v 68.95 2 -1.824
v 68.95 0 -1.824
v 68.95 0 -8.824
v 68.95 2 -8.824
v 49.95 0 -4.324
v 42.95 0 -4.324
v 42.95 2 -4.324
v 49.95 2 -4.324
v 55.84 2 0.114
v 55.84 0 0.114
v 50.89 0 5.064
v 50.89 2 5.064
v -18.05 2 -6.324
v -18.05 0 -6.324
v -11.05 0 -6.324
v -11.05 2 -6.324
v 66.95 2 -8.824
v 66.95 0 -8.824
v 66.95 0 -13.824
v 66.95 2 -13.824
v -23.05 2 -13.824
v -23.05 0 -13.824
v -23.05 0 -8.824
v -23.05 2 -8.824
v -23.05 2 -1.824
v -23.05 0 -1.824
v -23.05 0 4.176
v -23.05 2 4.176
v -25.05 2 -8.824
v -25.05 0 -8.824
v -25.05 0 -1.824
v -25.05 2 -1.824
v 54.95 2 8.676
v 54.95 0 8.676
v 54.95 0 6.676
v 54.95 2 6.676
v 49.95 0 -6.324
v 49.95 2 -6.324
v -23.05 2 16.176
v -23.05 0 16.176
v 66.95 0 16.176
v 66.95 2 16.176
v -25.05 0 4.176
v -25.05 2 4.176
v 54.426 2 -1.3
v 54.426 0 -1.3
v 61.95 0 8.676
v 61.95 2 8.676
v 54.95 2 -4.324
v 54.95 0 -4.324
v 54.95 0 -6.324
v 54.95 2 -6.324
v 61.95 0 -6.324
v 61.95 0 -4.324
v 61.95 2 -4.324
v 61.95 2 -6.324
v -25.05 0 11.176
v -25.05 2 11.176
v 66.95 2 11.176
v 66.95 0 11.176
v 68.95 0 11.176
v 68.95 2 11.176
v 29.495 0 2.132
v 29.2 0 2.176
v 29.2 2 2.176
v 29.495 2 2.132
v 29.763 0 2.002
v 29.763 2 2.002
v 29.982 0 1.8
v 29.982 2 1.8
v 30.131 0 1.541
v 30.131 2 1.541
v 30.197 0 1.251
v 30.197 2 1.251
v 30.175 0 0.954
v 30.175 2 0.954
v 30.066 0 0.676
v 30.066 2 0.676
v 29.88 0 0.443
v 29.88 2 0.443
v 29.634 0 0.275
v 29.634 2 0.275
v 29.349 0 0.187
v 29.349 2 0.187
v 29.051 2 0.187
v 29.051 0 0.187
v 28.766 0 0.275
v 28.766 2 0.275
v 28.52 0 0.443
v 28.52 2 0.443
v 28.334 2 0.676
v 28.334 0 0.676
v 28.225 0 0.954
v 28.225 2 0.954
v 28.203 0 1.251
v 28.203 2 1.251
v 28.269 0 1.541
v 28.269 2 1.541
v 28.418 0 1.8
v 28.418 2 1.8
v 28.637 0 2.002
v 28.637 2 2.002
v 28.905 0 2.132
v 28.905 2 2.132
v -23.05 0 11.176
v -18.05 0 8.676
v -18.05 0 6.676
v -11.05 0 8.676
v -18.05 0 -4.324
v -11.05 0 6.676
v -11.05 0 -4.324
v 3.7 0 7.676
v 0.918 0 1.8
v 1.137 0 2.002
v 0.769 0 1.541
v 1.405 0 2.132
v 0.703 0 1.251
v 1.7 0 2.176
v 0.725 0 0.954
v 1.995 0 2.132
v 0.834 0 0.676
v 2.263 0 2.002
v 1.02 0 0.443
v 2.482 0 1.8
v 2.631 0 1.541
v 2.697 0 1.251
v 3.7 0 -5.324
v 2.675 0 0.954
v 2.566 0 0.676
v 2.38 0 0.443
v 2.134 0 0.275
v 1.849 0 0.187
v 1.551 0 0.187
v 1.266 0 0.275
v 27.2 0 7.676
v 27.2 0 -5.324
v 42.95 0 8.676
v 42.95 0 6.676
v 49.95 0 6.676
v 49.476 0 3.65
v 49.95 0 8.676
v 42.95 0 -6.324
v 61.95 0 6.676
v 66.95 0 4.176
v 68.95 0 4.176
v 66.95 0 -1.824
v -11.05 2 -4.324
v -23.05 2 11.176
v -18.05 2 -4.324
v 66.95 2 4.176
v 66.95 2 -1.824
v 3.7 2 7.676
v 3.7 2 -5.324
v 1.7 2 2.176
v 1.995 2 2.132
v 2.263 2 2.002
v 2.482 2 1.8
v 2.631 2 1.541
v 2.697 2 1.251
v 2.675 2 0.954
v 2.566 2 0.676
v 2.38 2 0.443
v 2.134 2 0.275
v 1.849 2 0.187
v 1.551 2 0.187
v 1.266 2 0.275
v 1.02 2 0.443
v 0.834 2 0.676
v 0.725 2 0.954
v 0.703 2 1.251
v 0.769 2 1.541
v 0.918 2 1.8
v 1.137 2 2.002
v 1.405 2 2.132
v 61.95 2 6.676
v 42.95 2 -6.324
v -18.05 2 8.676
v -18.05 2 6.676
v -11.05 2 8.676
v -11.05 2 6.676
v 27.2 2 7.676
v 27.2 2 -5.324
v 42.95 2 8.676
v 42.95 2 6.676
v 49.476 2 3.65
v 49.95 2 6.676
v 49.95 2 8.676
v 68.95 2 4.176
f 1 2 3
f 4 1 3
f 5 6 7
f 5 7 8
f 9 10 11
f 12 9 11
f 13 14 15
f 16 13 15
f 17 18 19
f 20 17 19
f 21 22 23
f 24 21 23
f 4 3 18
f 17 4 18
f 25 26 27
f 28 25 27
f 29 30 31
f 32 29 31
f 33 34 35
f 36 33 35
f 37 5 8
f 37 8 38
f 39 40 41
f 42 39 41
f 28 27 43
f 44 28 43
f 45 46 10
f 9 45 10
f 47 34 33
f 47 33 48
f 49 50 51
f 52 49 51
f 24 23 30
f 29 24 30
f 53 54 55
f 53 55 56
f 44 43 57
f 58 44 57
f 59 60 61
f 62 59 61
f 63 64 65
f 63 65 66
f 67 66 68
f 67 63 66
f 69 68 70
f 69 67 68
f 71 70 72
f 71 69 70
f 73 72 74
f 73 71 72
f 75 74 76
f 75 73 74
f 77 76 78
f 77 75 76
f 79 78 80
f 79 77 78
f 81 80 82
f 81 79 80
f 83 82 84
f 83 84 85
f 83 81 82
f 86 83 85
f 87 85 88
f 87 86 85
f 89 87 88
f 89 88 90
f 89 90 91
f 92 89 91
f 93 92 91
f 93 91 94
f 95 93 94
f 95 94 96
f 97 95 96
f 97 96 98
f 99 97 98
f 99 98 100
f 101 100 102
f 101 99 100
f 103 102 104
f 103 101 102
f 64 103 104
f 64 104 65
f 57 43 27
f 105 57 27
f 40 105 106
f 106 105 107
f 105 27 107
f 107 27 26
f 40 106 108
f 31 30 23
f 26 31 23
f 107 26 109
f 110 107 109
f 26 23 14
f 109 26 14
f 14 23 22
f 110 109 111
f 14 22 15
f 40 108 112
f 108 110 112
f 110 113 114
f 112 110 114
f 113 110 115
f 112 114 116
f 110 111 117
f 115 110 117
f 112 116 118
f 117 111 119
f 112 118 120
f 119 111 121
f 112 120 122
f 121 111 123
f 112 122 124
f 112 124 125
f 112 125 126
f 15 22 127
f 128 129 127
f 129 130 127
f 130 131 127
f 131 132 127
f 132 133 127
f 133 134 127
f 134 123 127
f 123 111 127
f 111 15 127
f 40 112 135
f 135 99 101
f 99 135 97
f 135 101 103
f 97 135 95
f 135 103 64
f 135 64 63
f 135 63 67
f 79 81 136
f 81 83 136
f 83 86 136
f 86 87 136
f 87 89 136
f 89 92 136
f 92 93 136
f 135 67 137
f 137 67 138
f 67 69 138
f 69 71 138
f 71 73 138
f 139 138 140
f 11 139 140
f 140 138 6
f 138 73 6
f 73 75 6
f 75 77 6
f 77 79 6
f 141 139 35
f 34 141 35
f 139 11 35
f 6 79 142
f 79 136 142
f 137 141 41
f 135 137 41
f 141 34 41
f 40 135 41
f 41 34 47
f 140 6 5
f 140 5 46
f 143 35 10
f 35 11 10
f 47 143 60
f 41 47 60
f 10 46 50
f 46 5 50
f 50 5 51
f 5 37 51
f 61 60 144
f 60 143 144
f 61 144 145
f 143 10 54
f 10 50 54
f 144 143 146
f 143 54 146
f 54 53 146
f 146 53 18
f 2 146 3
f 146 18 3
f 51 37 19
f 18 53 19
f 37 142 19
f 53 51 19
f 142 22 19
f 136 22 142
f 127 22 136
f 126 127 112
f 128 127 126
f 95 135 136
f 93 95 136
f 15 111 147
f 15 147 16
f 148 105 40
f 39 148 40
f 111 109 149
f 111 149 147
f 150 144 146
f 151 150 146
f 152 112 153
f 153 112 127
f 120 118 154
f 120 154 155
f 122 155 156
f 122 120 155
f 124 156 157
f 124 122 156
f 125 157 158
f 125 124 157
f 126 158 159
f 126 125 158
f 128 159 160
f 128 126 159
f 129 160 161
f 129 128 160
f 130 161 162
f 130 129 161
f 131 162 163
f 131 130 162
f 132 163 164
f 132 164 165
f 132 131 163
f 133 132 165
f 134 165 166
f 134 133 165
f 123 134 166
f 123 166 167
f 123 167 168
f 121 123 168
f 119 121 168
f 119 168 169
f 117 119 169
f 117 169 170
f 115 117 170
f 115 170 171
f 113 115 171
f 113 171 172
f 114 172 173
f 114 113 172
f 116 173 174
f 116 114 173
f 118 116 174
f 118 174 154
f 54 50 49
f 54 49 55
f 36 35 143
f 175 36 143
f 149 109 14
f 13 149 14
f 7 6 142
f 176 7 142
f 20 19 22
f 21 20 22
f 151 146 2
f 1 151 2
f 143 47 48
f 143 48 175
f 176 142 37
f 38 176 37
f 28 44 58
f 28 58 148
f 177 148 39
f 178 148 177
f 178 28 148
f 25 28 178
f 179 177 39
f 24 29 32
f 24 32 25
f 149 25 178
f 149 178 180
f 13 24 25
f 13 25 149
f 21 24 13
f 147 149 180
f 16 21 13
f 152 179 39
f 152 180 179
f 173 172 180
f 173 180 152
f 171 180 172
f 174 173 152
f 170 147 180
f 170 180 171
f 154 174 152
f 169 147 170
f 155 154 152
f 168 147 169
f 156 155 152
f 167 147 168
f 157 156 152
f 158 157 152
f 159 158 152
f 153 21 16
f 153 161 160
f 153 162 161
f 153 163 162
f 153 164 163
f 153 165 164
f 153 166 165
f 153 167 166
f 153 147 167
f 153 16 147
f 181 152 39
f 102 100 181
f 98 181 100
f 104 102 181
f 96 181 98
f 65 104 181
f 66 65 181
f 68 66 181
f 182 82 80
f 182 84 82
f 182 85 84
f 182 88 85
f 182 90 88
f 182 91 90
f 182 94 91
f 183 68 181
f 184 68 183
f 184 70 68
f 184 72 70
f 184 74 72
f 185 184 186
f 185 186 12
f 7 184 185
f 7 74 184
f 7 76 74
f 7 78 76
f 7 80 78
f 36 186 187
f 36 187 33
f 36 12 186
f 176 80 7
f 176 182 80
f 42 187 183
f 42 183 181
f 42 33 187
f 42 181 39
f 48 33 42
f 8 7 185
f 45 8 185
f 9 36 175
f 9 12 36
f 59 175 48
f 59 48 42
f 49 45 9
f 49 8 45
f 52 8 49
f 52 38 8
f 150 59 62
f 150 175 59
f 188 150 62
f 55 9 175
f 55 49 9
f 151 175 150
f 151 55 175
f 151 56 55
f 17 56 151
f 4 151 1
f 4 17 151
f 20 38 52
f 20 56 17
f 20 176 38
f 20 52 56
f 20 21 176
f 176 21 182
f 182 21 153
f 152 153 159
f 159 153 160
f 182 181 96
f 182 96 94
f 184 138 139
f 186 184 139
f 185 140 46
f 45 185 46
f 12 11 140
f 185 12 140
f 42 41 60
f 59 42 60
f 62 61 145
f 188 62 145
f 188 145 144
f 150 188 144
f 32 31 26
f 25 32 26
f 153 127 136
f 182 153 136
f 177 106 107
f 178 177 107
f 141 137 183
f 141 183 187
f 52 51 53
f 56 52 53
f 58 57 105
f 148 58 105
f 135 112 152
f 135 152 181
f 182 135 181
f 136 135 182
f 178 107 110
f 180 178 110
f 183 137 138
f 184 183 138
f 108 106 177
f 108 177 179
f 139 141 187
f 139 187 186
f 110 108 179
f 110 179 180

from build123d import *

# Parameters (mm, degrees)
SKETCH1_W           = 7
SKETCH1_H           = 2
SKETCH1_R           = 1
SKETCH1_W_2         = 23.5
SKETCH1_H_2         = 13
BOSS_EXTRUDE1_DEPTH = 2


with BuildPart() as part:
    # Sketch1 → Boss-Extrude1 (new body)
    with BuildSketch(Plane(origin=(0, 0, 0), x_dir=(1, 0, 0), z_dir=(0, 1, 0))):
        Polygon((66.949898611, 13.823848353), (-23.050101389, 13.823848353), (-23.050101389, 8.823848353), (-25.050101389, 8.823848353), (-25.050101389, 1.823848353), (-23.050101389, 1.823848353), (-23.050101389, -4.176151647), (-25.050101389, -4.176151647), (-25.050101389, -11.176151647), (-23.050101389, -11.176151647), (-23.050101389, -16.176151647), (66.949898611, -16.176151647), (66.949898611, -11.176151647), (68.949898611, -11.176151647), (68.949898611, -4.176151647), (66.949898611, -4.176151647), (66.949898611, 1.823848353), (68.949898611, 1.823848353), (68.949898611, 8.823848353), (66.949898611, 8.823848353), align=None)
        with Locations((-14.550101389, -7.676151647)):
            Rectangle(SKETCH1_W, SKETCH1_H, mode=Mode.SUBTRACT)
        with Locations(Location((1.699898611, -1.176151647, 0), (0, 0, 270))):
            Circle(SKETCH1_R, mode=Mode.SUBTRACT)
        with Locations((15.449898611, -1.176151647)):
            Rectangle(SKETCH1_W_2, SKETCH1_H_2, mode=Mode.SUBTRACT)
        with Locations(Location((29.199898611, -1.176151647, 0), (0, 0, 270))):
            Circle(SKETCH1_R, mode=Mode.SUBTRACT)
        with Locations((46.449898611, -7.676151647)):
            Rectangle(SKETCH1_W, SKETCH1_H, mode=Mode.SUBTRACT)
        with Locations((58.449898611, -7.676151647)):
            Rectangle(SKETCH1_W, SKETCH1_H, mode=Mode.SUBTRACT)
        Polygon((55.839898611, -0.11430823), (50.890151142, -5.064055698), (49.47593758, -3.649842135), (54.425685048, 1.299905333), align=None, mode=Mode.SUBTRACT)
        with Locations((-14.550101389, 5.323848353)):
            Rectangle(SKETCH1_W, SKETCH1_H, mode=Mode.SUBTRACT)
        with Locations((46.449898611, 5.323848353)):
            Rectangle(SKETCH1_W, SKETCH1_H, mode=Mode.SUBTRACT)
        with Locations((58.449898611, 5.323848353)):
            Rectangle(SKETCH1_W, SKETCH1_H, mode=Mode.SUBTRACT)
    extrude(amount=BOSS_EXTRUDE1_DEPTH)


solid = part.part
